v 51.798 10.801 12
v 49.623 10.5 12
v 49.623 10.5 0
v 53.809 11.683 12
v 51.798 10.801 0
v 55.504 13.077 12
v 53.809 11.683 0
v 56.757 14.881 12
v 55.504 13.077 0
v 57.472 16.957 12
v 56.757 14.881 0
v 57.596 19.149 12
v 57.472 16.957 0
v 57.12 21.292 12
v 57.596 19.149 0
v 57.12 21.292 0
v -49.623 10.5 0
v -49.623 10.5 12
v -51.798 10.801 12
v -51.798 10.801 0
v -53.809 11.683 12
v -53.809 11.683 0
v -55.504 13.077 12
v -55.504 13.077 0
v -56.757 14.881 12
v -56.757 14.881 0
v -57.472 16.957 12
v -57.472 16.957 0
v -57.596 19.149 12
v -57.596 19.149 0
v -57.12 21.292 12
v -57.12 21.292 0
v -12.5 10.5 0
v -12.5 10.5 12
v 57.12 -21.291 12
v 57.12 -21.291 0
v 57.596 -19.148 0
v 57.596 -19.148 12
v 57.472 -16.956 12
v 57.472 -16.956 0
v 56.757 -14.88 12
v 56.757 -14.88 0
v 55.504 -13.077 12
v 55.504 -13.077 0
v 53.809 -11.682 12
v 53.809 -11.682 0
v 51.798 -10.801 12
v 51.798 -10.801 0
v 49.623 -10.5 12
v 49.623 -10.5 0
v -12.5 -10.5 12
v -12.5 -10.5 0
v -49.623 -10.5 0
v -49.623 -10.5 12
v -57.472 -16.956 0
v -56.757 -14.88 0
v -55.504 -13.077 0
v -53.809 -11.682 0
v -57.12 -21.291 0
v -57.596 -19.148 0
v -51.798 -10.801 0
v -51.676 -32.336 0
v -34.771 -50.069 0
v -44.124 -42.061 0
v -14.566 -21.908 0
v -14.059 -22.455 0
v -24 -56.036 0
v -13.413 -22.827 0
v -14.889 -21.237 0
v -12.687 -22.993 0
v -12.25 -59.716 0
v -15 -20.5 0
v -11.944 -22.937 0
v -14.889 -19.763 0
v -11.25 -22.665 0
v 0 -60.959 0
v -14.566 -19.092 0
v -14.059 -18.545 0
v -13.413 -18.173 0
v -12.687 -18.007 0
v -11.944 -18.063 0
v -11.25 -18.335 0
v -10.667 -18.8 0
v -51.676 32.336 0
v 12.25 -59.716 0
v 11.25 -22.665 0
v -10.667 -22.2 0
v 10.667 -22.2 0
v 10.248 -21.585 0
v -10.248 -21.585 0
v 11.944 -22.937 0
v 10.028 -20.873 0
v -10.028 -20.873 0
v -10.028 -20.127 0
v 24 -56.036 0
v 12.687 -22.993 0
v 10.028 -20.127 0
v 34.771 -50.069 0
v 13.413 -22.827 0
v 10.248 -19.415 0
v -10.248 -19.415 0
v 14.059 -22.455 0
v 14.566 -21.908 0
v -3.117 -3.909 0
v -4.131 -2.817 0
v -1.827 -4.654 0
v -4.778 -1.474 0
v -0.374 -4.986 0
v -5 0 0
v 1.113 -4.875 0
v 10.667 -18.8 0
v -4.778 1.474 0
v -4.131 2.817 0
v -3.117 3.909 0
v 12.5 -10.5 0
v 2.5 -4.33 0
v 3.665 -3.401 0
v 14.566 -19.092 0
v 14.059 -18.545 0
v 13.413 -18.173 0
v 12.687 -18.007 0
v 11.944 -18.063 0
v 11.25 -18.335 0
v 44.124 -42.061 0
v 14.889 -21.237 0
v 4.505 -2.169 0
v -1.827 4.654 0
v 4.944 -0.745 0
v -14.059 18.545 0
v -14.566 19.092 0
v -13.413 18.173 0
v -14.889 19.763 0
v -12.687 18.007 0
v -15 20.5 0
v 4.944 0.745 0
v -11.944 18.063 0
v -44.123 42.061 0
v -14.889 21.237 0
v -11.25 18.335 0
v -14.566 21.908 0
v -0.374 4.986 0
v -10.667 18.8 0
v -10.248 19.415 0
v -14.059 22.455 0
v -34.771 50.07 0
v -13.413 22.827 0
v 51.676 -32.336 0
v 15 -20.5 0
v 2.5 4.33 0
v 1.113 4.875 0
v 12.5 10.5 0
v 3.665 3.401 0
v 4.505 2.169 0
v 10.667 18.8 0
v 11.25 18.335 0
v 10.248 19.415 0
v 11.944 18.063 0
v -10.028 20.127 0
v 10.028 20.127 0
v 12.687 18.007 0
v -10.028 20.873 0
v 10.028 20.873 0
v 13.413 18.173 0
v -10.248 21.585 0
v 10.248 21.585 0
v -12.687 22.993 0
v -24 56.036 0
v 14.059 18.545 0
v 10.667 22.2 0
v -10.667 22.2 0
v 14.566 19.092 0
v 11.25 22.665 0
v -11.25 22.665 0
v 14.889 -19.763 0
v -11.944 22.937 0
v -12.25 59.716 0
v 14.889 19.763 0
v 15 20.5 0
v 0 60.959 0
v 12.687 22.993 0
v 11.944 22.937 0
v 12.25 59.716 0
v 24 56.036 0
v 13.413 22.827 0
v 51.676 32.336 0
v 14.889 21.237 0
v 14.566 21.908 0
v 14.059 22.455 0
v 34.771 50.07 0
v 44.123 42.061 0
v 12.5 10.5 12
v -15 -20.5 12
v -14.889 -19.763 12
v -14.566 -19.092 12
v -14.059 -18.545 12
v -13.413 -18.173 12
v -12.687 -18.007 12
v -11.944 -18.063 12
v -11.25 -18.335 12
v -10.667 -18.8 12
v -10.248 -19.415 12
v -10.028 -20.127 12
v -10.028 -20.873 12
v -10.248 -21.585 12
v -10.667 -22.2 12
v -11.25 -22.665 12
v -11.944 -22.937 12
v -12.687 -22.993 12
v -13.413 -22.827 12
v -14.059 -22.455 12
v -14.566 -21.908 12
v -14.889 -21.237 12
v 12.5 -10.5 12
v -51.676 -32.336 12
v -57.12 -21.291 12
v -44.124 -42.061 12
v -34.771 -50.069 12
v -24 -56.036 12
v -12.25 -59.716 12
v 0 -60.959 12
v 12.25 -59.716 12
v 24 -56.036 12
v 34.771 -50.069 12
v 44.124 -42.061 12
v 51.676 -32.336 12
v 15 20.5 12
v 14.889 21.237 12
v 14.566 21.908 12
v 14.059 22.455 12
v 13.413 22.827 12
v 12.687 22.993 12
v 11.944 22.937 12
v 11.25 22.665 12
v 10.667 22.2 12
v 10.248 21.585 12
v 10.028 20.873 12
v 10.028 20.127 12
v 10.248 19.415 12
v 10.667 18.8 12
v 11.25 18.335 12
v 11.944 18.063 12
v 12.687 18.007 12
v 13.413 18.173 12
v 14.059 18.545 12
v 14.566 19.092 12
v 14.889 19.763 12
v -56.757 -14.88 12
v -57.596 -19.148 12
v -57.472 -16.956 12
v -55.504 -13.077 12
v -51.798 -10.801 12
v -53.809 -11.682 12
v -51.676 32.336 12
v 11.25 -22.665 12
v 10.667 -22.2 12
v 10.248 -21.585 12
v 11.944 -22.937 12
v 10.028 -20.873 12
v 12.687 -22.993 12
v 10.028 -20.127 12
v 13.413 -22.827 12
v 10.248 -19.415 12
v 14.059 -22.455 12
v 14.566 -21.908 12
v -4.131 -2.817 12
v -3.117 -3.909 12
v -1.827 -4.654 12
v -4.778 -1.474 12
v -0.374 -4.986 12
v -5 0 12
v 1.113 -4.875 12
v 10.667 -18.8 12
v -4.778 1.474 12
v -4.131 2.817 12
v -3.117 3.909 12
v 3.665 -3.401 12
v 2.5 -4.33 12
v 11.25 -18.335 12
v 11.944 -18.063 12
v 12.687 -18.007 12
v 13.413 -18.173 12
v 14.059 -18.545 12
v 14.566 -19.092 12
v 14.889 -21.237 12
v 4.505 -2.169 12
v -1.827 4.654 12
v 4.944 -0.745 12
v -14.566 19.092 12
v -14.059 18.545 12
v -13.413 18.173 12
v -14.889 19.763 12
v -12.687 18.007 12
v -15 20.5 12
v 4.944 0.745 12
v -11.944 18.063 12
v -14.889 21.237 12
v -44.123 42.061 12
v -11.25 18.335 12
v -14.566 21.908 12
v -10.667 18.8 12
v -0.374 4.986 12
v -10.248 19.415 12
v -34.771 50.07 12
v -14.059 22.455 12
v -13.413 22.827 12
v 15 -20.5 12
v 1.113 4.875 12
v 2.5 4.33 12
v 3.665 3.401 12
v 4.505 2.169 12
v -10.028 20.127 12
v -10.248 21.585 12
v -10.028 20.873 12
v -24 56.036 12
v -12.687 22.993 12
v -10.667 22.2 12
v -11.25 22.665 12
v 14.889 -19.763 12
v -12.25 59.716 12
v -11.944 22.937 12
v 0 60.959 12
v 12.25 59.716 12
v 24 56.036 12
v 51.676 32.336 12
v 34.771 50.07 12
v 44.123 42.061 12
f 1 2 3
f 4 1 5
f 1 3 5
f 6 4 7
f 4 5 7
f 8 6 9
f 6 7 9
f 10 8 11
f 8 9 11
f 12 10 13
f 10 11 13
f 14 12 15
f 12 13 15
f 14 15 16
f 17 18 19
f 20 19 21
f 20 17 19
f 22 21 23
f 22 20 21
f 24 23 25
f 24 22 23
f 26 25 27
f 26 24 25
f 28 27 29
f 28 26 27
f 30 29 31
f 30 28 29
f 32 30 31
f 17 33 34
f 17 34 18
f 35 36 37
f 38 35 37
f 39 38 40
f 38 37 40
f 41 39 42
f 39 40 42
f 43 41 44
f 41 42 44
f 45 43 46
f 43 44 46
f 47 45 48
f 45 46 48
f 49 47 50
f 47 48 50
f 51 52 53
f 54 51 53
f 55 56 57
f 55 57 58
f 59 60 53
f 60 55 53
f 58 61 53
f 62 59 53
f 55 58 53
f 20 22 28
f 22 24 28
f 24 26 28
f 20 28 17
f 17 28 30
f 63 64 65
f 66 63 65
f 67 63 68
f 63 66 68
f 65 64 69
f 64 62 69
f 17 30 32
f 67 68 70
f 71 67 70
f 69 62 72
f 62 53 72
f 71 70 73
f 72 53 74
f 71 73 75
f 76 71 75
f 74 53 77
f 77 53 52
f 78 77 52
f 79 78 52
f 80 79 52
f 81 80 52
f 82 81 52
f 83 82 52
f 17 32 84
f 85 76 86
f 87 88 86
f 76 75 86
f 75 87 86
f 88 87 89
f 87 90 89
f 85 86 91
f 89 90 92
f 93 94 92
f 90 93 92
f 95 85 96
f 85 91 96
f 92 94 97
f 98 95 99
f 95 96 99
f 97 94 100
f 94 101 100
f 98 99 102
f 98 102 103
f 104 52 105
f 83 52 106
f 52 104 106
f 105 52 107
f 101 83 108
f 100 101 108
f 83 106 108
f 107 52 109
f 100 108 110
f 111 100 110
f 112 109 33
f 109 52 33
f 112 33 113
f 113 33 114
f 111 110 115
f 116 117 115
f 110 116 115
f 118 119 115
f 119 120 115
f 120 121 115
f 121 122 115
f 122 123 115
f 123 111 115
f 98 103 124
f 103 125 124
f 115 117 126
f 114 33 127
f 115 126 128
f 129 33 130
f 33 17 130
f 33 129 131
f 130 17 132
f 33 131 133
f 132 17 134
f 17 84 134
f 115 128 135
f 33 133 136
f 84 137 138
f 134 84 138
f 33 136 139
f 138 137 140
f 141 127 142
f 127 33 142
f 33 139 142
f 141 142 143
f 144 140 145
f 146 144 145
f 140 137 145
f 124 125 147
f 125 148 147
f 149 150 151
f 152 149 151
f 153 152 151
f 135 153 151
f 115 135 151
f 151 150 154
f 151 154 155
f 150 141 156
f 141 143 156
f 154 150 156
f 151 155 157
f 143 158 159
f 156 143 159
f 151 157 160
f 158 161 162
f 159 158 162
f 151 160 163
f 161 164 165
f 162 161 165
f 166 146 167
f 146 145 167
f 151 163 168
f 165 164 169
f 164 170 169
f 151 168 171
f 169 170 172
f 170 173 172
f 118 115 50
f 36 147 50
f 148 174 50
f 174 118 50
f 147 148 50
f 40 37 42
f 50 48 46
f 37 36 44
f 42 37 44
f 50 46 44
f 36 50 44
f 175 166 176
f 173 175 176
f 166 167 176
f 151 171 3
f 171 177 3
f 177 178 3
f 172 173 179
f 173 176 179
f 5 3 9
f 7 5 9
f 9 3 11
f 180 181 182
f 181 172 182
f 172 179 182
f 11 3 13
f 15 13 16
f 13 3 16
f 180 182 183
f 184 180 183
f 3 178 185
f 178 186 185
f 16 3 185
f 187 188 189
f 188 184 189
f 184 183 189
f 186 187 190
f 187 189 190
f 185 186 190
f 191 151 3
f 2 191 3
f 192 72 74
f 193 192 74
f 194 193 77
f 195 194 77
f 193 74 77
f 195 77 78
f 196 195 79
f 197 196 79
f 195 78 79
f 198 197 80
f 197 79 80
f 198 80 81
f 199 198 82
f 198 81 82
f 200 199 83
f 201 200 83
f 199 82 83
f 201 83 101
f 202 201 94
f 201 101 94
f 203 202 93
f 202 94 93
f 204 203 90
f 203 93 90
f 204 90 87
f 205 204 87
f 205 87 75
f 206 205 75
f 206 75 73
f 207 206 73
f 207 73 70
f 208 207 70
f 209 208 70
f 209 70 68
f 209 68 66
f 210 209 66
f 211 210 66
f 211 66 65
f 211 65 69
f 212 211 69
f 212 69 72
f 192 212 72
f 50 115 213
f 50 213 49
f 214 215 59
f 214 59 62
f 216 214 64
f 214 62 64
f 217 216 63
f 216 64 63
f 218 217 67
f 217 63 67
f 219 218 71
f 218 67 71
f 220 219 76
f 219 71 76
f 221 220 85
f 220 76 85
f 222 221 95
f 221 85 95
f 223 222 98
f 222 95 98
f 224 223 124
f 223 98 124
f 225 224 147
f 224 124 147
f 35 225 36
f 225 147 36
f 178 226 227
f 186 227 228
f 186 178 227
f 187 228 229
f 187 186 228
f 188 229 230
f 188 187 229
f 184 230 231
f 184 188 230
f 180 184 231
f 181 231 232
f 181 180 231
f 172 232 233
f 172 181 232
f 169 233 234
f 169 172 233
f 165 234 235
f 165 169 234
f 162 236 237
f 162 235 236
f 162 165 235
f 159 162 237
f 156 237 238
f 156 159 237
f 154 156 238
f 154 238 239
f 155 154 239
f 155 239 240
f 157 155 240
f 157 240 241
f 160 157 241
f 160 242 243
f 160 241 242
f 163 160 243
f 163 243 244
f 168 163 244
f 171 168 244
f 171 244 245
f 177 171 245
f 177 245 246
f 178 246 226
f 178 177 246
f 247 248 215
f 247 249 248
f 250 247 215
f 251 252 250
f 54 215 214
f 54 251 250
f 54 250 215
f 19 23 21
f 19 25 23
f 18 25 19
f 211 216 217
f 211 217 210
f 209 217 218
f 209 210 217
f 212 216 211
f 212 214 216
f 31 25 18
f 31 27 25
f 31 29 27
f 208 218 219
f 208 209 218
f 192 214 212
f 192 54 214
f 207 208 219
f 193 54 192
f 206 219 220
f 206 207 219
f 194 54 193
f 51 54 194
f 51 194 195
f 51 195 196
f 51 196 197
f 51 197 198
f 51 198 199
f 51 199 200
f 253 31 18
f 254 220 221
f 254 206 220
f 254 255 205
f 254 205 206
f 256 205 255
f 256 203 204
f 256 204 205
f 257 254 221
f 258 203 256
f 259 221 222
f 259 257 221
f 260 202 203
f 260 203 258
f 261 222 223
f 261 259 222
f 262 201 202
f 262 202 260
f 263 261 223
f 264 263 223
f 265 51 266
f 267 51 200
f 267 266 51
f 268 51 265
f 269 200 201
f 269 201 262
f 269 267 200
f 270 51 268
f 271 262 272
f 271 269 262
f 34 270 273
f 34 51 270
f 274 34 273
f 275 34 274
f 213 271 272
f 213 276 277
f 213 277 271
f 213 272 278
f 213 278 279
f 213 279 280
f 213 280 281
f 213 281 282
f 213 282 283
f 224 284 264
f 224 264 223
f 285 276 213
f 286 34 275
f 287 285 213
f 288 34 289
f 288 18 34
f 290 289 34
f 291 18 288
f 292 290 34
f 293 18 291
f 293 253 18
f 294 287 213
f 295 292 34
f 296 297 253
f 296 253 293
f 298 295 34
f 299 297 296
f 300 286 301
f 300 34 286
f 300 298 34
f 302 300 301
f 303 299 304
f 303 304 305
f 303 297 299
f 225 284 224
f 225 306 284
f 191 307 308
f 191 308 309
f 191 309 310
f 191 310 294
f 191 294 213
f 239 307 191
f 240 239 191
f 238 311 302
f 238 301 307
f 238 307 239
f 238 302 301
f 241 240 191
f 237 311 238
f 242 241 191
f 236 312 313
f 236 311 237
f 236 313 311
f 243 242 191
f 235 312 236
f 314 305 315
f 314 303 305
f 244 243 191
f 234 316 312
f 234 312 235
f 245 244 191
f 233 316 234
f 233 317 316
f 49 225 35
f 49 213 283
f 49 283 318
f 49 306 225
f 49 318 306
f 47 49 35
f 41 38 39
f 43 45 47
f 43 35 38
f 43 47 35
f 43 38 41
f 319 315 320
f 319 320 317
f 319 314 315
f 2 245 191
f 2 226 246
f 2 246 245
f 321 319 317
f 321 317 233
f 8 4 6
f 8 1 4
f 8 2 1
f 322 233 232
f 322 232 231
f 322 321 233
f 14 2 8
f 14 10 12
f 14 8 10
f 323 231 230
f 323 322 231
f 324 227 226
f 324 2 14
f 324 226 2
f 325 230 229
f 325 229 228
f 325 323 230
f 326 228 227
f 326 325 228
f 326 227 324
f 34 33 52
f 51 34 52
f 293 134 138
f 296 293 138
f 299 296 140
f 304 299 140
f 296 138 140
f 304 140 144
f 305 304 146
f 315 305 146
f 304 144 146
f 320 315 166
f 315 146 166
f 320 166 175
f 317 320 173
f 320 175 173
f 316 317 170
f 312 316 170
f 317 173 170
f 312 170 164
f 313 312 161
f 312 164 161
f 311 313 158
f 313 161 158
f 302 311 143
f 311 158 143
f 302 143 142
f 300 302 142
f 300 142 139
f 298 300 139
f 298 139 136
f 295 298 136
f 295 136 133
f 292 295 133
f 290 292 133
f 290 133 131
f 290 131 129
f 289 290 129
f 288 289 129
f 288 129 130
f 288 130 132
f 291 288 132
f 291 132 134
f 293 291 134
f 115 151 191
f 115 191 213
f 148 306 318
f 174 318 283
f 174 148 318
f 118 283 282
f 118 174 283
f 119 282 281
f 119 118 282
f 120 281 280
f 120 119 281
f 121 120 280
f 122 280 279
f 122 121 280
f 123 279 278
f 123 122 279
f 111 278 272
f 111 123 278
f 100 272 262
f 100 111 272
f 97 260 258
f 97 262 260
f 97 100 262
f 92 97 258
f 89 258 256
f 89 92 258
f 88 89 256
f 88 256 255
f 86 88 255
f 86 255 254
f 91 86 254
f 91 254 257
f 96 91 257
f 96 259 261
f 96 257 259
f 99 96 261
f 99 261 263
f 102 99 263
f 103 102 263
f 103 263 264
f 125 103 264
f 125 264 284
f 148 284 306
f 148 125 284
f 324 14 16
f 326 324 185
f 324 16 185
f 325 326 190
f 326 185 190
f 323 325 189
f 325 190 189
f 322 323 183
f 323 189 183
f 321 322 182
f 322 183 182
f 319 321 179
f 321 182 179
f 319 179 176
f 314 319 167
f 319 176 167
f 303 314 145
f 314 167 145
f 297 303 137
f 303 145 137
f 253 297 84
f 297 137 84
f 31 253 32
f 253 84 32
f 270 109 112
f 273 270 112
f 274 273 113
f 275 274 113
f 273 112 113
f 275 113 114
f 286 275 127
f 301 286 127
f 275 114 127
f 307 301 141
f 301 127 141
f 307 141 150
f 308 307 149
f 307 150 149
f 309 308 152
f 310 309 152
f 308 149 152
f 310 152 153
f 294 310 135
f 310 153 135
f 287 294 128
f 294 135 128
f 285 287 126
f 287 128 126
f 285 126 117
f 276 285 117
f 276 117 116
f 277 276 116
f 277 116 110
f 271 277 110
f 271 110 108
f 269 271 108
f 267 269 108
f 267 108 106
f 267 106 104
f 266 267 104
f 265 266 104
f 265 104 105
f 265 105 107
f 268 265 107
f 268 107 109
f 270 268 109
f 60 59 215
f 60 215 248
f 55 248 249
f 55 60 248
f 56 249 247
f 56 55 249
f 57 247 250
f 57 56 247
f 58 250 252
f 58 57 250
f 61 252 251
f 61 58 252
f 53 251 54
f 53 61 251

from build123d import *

# Parameters (mm, degrees)
SKETCH_R        = 60.95906
PAD_DEPTH       = 12
SKETCH001_R     = 5
POCKET_DEPTH    = 12.001
SKETCH002_R     = 2.5
POCKET005_DEPTH = 357.671689
POCKET004_DEPTH = 357.671689


with BuildPart() as part:
    # Sketch → Pad (new body)
    with BuildSketch(Plane.XY):
        Circle(SKETCH_R)
    extrude(amount=PAD_DEPTH)

    # Sketch001 → Pocket (cut, through all)
    with BuildSketch(Plane(origin=(0, 0, 0), x_dir=(-1, 0, 0), z_dir=(0, 0, -1))):
        Circle(SKETCH001_R)
    extrude(amount=-POCKET_DEPTH, mode=Mode.SUBTRACT)

    # Sketch002 → Pocket005 (cut, through all)
    with BuildSketch(Plane(origin=(0, 0, 0), x_dir=(-1, 0, 0), z_dir=(0, 0, -1))):
        with Locations((12.5, 20.5)):
            Circle(SKETCH002_R)
        with Locations((12.5, -20.5)):
            Circle(SKETCH002_R)
    pocket005 = extrude(amount=-POCKET005_DEPTH, mode=Mode.SUBTRACT)

    # Mirrored001: Pocket005 across Sketch002 V_Axis
    add(pocket005.mirror(Plane(origin=(0, 0, 0), x_dir=(0, 0, -1), z_dir=(-1, 0, 0))), mode=Mode.SUBTRACT)

    # Sketch005 → Pocket004 (cut, through all)
    with BuildSketch(Plane(origin=(0, 0, 0), x_dir=(-1, 0, 0), z_dir=(0, 0, -1))):
        with BuildLine():
            Line((12.5, 10.5), (49.622697, 10.5))
            ThreePointArc((49.622697, 10.5), (56.193721, 13.936925), (57.118715, 21.294587))
            ThreePointArc((57.118706, -21.294612), (60.95906, -1.3e-05), (57.118715, 21.294587))
            ThreePointArc((57.118706, -21.294612), (56.193728, -13.936936), (49.622697, -10.5))
            Line((12.5, -10.5), (49.622697, -10.5))
            Line((12.5, 0), (12.5, -10.5))
            Line((12.5, 10.5), (12.5, 0))
        make_face()
    pocket004 = extrude(amount=-POCKET004_DEPTH, mode=Mode.SUBTRACT)

    # Mirrored: Pocket004 across Sketch005 V_Axis
    add(pocket004.mirror(Plane(origin=(0, 0, 0), x_dir=(0, 0, -1), z_dir=(-1, 0, 0))), mode=Mode.SUBTRACT)


solid = part.part
